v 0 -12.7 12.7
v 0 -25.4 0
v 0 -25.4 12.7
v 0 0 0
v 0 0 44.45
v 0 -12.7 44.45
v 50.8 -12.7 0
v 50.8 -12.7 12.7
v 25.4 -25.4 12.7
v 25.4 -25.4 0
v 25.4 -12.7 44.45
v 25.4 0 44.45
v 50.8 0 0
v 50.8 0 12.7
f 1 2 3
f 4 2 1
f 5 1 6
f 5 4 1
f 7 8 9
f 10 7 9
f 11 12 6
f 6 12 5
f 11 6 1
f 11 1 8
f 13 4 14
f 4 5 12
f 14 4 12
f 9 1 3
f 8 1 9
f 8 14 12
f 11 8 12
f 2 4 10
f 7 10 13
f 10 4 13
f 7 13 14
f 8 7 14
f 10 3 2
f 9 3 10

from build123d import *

# Parameters (mm, degrees)
F1_DEPTH = 12.7
F2_W     = 50.8
F2_H     = 12.7
F3_DEPTH = 12.7
F5_DEPTH = 25.4


with BuildPart() as f1:
    # F0 (on Front) → F1 (new body)
    with BuildSketch(Plane.XZ):
        Polygon((0, 44.45), (0, 0), (50.8, 0), (50.8, 12.7), (25.4, 44.45), align=None)
    extrude(amount=F1_DEPTH)

    # F2 (on face) → F3 (join)
    with BuildSketch(Plane.XZ.offset(12.7)):
        with Locations((25.4, 6.35)):
            Rectangle(F2_W, F2_H)
    extrude(amount=F3_DEPTH)

    # F4 (on face) → F5 (cut)
    with BuildSketch(Plane.XY.offset(12.7)):
        Polygon((50.8, -12.7), (25.4, -25.4), (50.8, -25.4), align=None)
    extrude(amount=-F5_DEPTH, mode=Mode.SUBTRACT)


solid = f1.part
